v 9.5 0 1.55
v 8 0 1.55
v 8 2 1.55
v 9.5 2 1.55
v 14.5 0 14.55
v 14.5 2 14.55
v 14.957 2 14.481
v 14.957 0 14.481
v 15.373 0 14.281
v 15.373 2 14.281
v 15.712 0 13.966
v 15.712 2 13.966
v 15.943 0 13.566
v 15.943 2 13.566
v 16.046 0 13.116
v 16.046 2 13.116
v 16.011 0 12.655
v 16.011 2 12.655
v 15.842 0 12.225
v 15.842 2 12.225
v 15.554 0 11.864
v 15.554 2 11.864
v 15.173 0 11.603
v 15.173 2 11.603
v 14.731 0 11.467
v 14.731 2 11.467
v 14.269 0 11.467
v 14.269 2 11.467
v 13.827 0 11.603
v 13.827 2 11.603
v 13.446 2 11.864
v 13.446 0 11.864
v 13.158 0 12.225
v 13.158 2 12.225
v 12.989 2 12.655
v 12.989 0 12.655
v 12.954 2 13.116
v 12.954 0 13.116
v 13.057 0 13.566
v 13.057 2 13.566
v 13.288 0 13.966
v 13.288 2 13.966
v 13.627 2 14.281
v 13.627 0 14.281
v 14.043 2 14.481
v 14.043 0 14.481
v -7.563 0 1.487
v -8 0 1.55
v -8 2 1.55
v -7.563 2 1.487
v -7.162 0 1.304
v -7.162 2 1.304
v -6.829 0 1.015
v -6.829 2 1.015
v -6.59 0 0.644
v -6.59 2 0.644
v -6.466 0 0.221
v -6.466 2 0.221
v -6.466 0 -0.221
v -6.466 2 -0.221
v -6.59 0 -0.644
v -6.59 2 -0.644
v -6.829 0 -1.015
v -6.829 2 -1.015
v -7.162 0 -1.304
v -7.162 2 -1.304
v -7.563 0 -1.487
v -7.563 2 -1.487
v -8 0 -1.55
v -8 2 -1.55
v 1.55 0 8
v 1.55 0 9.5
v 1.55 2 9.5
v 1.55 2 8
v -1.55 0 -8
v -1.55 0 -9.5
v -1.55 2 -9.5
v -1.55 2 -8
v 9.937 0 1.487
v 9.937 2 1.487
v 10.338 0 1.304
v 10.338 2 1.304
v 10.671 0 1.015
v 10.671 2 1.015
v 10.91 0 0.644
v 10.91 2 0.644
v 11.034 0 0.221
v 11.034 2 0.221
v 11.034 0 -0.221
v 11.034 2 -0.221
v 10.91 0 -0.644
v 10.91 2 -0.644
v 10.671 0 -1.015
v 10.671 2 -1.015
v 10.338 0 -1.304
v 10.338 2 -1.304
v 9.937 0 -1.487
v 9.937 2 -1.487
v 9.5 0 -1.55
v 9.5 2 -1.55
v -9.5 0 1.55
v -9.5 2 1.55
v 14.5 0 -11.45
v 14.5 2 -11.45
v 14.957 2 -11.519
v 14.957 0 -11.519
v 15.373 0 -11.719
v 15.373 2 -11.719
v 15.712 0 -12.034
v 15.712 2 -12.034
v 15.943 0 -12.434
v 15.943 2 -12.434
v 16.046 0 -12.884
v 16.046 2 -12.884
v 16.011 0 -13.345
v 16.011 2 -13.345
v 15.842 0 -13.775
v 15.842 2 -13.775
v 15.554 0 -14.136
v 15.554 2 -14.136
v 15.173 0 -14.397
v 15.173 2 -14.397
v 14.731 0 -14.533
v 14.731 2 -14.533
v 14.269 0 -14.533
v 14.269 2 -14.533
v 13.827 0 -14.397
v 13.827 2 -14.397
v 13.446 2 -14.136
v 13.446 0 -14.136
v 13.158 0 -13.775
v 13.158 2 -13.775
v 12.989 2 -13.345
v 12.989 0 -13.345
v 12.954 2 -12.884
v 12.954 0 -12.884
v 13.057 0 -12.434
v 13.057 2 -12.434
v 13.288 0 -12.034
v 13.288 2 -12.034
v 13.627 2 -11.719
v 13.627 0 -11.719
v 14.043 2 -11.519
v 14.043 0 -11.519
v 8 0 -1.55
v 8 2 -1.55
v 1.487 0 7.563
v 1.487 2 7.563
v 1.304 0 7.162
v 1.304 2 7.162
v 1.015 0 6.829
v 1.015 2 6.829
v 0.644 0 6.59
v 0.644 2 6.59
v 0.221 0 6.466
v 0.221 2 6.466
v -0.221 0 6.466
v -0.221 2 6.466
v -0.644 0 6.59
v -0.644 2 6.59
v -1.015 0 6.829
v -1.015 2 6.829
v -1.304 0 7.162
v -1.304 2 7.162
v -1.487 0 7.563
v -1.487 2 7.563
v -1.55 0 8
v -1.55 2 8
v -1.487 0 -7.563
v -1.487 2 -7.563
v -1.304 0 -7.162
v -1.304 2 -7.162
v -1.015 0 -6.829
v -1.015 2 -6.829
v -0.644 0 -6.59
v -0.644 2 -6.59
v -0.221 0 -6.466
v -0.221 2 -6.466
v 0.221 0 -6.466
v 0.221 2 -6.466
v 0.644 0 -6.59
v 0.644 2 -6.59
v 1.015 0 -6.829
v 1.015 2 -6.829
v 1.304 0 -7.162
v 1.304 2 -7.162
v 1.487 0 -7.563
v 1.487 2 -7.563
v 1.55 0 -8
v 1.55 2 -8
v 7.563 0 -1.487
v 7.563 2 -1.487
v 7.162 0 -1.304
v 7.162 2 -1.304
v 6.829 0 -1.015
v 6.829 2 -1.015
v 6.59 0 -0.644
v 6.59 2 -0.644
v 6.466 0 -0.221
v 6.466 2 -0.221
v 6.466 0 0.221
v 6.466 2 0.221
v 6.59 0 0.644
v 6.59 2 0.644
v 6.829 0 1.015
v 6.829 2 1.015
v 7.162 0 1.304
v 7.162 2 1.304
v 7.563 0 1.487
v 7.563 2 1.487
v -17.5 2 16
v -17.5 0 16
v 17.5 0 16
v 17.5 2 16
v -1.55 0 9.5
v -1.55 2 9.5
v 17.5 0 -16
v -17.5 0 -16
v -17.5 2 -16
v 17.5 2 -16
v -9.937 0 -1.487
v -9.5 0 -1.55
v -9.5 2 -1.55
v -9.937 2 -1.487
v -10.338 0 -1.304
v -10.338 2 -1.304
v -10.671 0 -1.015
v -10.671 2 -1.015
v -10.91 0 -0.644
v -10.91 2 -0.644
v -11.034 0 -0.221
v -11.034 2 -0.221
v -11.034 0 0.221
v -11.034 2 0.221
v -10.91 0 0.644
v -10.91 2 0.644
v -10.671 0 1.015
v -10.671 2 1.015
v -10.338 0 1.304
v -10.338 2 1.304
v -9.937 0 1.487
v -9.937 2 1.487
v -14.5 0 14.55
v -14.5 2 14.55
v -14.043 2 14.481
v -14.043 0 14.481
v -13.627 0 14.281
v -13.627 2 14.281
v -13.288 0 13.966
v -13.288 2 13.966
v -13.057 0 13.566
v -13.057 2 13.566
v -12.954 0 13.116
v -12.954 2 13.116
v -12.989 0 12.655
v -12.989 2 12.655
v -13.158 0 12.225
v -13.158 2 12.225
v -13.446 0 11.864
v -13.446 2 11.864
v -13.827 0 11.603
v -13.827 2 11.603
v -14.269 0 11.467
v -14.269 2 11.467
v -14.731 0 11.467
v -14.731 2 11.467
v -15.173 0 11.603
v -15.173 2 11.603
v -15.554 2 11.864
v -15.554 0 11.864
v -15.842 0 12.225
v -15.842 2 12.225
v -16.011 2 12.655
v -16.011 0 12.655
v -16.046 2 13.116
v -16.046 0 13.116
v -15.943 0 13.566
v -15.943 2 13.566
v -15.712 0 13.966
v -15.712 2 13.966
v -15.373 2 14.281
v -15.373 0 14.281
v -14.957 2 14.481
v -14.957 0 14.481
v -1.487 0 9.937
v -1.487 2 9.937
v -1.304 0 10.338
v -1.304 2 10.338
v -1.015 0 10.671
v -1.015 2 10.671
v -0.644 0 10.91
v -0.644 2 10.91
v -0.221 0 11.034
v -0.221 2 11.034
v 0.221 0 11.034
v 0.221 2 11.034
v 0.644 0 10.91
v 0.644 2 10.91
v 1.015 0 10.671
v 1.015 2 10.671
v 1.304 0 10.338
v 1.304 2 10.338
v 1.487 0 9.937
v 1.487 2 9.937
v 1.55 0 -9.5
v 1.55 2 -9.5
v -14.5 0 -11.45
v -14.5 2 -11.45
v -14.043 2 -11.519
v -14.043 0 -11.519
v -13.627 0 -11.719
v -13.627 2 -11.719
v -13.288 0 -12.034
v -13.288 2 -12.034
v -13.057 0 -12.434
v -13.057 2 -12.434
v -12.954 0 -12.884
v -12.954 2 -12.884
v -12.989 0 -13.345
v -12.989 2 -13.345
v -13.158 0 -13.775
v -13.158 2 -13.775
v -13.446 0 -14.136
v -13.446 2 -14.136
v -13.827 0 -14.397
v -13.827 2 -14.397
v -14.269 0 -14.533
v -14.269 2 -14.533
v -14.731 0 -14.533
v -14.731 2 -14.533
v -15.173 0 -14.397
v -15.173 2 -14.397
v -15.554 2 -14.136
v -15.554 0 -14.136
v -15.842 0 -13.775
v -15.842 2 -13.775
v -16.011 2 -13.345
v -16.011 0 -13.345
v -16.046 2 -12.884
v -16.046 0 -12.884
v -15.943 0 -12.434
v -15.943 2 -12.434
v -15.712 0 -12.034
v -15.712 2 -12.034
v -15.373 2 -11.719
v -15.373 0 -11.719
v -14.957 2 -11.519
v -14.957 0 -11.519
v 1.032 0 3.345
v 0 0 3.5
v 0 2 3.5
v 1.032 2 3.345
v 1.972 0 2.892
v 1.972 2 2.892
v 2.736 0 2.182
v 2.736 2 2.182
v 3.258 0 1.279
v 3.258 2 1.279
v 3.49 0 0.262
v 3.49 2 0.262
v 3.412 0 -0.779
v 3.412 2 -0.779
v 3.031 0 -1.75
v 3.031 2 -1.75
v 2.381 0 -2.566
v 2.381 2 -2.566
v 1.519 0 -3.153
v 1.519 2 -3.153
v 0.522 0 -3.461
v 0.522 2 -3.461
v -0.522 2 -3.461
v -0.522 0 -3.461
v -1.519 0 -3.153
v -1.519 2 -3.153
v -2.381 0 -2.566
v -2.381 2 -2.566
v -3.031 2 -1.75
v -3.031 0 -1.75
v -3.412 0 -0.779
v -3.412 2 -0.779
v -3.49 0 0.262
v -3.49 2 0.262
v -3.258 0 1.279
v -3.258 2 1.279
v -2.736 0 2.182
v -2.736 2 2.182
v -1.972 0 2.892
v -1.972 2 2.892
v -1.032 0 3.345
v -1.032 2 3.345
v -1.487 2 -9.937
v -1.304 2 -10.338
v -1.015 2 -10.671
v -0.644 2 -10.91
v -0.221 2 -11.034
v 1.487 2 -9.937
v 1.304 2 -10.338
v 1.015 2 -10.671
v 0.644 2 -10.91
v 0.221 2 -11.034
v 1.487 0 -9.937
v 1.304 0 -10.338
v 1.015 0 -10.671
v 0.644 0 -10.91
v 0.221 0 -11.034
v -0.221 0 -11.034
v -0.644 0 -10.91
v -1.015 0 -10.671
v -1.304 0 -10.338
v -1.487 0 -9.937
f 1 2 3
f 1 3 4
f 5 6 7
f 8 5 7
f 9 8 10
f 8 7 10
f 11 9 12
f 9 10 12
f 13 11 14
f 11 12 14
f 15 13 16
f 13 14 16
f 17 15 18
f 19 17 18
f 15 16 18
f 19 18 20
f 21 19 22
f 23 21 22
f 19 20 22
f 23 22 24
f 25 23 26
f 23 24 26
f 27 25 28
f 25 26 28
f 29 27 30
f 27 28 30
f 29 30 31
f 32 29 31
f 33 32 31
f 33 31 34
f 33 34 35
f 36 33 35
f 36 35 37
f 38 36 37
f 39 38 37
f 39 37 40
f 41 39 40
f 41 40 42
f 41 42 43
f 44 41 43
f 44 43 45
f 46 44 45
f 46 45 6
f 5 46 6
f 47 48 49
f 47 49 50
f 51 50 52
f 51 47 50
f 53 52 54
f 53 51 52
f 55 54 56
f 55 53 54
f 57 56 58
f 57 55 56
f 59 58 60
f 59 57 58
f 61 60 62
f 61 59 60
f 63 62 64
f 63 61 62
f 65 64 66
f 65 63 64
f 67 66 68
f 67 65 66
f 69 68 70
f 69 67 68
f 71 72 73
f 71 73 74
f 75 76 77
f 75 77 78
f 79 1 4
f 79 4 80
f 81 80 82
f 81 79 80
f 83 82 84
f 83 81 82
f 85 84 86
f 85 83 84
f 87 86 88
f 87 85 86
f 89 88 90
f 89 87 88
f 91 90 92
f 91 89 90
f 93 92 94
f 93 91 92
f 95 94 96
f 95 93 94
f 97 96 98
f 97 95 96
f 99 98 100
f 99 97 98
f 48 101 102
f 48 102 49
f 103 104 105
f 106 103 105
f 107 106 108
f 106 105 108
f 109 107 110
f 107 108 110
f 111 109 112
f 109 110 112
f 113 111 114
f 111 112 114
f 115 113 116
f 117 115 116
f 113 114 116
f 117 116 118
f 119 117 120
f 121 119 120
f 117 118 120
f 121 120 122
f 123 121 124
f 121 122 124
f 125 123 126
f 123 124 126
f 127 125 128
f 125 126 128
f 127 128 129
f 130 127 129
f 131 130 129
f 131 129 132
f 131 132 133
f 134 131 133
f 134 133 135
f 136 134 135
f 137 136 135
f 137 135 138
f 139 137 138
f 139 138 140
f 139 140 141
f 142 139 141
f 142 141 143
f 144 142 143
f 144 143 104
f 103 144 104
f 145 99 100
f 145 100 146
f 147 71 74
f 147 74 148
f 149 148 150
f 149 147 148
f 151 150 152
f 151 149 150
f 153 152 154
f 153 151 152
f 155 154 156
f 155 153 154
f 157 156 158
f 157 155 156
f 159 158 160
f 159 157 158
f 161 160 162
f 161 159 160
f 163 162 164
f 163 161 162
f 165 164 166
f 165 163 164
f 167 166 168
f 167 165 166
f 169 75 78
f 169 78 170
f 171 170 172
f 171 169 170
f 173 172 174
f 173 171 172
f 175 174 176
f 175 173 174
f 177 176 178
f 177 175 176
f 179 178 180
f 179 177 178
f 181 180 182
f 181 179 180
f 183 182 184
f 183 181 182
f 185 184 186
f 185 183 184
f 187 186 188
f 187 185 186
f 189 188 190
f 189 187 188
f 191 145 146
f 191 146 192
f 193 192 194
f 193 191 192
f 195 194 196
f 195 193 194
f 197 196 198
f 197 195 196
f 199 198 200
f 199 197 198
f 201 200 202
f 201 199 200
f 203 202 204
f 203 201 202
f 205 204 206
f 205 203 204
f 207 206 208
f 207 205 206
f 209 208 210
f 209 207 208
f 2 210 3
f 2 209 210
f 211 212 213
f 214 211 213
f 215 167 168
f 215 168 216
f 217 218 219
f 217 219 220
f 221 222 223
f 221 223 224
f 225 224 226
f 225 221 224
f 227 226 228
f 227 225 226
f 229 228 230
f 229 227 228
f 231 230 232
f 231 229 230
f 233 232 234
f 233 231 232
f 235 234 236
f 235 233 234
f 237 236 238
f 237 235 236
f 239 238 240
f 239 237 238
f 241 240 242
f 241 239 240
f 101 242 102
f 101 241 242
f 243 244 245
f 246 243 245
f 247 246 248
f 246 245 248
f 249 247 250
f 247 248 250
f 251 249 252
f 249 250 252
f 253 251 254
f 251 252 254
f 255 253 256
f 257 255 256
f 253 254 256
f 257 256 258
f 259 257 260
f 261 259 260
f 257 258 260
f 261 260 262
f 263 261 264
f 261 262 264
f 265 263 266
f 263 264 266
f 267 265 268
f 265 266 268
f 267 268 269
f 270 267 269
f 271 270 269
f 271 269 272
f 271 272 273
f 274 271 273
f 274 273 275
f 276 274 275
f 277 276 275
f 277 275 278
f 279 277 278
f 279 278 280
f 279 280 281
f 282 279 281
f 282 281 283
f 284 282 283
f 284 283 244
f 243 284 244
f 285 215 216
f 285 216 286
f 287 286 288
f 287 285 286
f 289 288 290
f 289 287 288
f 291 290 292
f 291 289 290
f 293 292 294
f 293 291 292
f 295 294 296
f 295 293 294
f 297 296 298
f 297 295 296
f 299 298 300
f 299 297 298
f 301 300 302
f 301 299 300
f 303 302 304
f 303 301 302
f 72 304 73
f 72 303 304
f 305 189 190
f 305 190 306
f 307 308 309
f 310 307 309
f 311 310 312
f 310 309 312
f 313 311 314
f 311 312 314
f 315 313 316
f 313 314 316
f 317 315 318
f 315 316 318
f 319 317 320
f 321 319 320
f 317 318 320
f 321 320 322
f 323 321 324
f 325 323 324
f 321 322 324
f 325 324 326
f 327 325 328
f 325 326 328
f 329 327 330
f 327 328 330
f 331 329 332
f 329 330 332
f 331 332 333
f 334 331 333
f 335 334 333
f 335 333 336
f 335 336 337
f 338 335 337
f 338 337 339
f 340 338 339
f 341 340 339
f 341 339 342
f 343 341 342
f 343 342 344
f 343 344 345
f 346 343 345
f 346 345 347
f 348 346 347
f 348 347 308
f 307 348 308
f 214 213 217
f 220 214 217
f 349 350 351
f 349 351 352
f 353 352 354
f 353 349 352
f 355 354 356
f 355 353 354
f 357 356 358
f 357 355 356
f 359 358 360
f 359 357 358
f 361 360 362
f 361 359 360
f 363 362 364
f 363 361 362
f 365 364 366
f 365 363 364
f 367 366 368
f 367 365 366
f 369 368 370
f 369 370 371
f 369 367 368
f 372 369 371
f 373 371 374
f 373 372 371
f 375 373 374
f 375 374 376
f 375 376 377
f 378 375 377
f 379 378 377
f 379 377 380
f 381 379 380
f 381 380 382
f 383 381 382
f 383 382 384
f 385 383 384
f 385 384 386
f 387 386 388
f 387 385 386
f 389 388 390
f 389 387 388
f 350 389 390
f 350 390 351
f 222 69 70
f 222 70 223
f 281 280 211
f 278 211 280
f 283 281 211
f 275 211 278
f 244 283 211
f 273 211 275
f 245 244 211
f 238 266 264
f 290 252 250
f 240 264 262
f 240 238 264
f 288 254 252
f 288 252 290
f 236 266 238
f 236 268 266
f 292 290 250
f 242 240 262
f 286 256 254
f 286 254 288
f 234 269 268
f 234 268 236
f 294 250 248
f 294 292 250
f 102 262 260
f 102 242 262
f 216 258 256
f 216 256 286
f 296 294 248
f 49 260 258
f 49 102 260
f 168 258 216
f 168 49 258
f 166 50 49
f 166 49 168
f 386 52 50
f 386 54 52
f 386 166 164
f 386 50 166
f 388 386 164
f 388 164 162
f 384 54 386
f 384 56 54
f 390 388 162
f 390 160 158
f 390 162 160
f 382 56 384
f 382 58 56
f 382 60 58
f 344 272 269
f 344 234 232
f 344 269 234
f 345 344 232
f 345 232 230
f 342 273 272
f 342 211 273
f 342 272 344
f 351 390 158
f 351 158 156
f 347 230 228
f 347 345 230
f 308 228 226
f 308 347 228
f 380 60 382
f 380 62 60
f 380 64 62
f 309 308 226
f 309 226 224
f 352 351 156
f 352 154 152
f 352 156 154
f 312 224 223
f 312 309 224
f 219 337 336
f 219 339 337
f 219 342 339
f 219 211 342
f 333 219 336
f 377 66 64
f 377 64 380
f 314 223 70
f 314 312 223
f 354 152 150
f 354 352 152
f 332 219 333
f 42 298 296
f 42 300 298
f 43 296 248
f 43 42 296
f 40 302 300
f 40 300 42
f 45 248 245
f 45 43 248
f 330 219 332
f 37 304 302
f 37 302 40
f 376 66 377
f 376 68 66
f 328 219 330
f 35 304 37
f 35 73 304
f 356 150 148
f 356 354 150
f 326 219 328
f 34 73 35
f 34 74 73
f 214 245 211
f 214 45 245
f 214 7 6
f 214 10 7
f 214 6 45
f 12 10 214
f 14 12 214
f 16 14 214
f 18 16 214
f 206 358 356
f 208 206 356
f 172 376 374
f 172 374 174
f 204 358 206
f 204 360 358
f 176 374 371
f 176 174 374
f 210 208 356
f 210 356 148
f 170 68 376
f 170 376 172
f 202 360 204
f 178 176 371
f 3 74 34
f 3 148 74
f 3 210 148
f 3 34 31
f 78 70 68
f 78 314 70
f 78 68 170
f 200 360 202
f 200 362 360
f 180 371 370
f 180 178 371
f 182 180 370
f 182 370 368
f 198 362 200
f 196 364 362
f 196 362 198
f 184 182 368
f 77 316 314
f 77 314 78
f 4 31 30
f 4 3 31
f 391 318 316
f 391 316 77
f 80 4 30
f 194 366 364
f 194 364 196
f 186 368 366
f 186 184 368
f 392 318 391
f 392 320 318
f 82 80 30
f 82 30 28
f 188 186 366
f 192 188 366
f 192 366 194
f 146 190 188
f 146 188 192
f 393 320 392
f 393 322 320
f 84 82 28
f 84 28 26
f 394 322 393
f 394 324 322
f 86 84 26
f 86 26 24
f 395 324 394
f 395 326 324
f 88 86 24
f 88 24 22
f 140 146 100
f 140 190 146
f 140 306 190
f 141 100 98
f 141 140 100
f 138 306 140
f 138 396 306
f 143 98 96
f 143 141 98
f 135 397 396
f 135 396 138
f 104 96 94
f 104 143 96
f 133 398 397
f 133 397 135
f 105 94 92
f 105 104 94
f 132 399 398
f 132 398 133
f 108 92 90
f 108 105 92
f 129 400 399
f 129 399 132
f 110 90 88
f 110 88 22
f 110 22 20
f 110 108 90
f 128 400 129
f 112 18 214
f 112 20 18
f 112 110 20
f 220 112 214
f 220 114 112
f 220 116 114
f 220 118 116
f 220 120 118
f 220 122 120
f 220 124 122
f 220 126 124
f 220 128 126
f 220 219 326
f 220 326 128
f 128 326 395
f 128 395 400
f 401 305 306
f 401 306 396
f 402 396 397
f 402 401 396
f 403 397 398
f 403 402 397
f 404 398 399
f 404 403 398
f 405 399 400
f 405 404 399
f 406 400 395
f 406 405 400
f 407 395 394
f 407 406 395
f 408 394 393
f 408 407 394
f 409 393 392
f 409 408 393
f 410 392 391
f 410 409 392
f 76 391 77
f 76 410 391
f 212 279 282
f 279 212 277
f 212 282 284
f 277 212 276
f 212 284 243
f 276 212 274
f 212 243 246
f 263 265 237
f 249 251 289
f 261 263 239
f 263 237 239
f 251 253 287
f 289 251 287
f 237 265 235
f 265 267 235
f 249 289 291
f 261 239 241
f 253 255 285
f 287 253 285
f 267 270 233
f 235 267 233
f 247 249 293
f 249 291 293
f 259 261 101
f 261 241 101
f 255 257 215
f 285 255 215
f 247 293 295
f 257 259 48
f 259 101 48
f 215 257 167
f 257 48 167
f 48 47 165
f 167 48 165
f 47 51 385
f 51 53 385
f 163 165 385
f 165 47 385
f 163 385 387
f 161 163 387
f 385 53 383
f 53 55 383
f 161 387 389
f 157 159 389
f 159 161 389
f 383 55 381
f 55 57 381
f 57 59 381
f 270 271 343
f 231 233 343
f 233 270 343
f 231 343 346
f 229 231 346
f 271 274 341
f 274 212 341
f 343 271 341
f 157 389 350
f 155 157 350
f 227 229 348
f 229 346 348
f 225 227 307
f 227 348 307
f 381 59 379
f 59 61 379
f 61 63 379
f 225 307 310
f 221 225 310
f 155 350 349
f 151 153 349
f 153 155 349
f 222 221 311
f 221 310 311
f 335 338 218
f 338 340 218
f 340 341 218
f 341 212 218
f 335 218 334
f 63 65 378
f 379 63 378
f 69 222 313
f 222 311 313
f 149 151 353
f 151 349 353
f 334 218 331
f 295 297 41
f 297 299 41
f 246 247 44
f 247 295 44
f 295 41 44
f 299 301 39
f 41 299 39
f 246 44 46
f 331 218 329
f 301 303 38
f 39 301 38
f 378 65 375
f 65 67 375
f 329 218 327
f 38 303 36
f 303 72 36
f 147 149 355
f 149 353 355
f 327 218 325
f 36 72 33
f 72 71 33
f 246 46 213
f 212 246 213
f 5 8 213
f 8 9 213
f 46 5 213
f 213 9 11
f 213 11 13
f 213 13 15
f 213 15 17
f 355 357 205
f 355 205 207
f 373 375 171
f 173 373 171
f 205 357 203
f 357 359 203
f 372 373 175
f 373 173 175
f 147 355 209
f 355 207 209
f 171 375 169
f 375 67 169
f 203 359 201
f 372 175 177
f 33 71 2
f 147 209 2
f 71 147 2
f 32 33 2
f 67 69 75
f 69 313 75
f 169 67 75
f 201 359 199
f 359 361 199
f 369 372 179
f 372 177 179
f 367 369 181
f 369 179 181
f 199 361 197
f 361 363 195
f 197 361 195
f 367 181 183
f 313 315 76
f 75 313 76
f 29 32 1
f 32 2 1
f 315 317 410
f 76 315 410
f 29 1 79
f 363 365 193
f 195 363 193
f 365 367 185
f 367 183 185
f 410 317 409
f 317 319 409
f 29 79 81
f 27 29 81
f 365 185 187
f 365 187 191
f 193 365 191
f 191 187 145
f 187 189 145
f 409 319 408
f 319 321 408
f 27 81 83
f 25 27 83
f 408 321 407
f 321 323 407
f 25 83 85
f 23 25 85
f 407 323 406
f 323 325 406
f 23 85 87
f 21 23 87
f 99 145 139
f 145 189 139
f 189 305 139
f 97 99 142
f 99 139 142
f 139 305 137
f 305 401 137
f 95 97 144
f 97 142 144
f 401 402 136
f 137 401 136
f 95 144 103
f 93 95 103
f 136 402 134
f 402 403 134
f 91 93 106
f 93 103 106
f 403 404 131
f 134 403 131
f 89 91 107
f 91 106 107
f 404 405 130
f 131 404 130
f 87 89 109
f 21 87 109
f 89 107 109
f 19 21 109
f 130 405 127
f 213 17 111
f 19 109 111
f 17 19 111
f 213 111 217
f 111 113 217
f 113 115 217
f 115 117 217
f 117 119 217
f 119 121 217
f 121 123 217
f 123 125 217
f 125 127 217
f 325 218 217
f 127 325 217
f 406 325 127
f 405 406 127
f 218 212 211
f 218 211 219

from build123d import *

# Parameters (mm, degrees)
SKETCH_1_W          = 35
SKETCH_1_H          = 32
SKETCH_1_R          = 3.5
EXTRUDE_1_DEPTH     = 2
SKETCH_2_R          = 1.55
CUT_EXTRUDE_1_DEPTH = 10


with BuildPart() as part:
    # 草图1 → 凸台-拉伸1 (new body)
    with BuildSketch(Plane(origin=(0, 0, 0), x_dir=(1, 0, 0), z_dir=(0, 1, 0))):
        Rectangle(SKETCH_1_W, SKETCH_1_H)
        with Locations(Location((0, 0, 0), (0, 0, 270))):
            Circle(SKETCH_1_R, mode=Mode.SUBTRACT)
        with BuildLine():
            Line((-1.55, 9.5), (-1.55, 8))
            ThreePointArc((-1.55, 8), (0, 6.45), (1.55, 8))
            Line((1.55, 8), (1.55, 9.5))
            ThreePointArc((1.55, 9.5), (0, 11.05), (-1.55, 9.5))
        make_face(mode=Mode.SUBTRACT)
        with BuildLine():
            Line((1.55, -9.5), (1.55, -8))
            ThreePointArc((1.55, -8), (0, -6.45), (-1.55, -8))
            Line((-1.55, -8), (-1.55, -9.5))
            ThreePointArc((-1.55, -9.5), (0, -11.05), (1.55, -9.5))
        make_face(mode=Mode.SUBTRACT)
        with BuildLine():
            Line((-9.5, -1.55), (-8, -1.55))
            ThreePointArc((-8, -1.55), (-6.45, 0), (-8, 1.55))
            Line((-8, 1.55), (-9.5, 1.55))
            ThreePointArc((-9.5, 1.55), (-11.05, 0), (-9.5, -1.55))
        make_face(mode=Mode.SUBTRACT)
        with BuildLine():
            Line((9.5, 1.55), (8, 1.55))
            ThreePointArc((8, 1.55), (6.45, 0), (8, -1.55))
            Line((8, -1.55), (9.5, -1.55))
            ThreePointArc((9.5, -1.55), (11.05, 0), (9.5, 1.55))
        make_face(mode=Mode.SUBTRACT)
    extrude(amount=EXTRUDE_1_DEPTH)

    # 草图2 → 切除-拉伸1 (cut)
    with BuildSketch(Plane(origin=(0, 2, 0), x_dir=(1, 0, 0), z_dir=(0, 1, 0))):
        with Locations(Location((-14.5, 13, 0), (0, 0, 270))):
            Circle(SKETCH_2_R)
        with Locations(Location((-14.5, -13, 0), (0, 0, 270))):
            Circle(SKETCH_2_R)
        with Locations(Location((14.5, -13, 0), (0, 0, 270))):
            Circle(SKETCH_2_R)
        with Locations(Location((14.5, 13, 0), (0, 0, 270))):
            Circle(SKETCH_2_R)
    extrude(amount=-CUT_EXTRUDE_1_DEPTH, mode=Mode.SUBTRACT)


solid = part.part
